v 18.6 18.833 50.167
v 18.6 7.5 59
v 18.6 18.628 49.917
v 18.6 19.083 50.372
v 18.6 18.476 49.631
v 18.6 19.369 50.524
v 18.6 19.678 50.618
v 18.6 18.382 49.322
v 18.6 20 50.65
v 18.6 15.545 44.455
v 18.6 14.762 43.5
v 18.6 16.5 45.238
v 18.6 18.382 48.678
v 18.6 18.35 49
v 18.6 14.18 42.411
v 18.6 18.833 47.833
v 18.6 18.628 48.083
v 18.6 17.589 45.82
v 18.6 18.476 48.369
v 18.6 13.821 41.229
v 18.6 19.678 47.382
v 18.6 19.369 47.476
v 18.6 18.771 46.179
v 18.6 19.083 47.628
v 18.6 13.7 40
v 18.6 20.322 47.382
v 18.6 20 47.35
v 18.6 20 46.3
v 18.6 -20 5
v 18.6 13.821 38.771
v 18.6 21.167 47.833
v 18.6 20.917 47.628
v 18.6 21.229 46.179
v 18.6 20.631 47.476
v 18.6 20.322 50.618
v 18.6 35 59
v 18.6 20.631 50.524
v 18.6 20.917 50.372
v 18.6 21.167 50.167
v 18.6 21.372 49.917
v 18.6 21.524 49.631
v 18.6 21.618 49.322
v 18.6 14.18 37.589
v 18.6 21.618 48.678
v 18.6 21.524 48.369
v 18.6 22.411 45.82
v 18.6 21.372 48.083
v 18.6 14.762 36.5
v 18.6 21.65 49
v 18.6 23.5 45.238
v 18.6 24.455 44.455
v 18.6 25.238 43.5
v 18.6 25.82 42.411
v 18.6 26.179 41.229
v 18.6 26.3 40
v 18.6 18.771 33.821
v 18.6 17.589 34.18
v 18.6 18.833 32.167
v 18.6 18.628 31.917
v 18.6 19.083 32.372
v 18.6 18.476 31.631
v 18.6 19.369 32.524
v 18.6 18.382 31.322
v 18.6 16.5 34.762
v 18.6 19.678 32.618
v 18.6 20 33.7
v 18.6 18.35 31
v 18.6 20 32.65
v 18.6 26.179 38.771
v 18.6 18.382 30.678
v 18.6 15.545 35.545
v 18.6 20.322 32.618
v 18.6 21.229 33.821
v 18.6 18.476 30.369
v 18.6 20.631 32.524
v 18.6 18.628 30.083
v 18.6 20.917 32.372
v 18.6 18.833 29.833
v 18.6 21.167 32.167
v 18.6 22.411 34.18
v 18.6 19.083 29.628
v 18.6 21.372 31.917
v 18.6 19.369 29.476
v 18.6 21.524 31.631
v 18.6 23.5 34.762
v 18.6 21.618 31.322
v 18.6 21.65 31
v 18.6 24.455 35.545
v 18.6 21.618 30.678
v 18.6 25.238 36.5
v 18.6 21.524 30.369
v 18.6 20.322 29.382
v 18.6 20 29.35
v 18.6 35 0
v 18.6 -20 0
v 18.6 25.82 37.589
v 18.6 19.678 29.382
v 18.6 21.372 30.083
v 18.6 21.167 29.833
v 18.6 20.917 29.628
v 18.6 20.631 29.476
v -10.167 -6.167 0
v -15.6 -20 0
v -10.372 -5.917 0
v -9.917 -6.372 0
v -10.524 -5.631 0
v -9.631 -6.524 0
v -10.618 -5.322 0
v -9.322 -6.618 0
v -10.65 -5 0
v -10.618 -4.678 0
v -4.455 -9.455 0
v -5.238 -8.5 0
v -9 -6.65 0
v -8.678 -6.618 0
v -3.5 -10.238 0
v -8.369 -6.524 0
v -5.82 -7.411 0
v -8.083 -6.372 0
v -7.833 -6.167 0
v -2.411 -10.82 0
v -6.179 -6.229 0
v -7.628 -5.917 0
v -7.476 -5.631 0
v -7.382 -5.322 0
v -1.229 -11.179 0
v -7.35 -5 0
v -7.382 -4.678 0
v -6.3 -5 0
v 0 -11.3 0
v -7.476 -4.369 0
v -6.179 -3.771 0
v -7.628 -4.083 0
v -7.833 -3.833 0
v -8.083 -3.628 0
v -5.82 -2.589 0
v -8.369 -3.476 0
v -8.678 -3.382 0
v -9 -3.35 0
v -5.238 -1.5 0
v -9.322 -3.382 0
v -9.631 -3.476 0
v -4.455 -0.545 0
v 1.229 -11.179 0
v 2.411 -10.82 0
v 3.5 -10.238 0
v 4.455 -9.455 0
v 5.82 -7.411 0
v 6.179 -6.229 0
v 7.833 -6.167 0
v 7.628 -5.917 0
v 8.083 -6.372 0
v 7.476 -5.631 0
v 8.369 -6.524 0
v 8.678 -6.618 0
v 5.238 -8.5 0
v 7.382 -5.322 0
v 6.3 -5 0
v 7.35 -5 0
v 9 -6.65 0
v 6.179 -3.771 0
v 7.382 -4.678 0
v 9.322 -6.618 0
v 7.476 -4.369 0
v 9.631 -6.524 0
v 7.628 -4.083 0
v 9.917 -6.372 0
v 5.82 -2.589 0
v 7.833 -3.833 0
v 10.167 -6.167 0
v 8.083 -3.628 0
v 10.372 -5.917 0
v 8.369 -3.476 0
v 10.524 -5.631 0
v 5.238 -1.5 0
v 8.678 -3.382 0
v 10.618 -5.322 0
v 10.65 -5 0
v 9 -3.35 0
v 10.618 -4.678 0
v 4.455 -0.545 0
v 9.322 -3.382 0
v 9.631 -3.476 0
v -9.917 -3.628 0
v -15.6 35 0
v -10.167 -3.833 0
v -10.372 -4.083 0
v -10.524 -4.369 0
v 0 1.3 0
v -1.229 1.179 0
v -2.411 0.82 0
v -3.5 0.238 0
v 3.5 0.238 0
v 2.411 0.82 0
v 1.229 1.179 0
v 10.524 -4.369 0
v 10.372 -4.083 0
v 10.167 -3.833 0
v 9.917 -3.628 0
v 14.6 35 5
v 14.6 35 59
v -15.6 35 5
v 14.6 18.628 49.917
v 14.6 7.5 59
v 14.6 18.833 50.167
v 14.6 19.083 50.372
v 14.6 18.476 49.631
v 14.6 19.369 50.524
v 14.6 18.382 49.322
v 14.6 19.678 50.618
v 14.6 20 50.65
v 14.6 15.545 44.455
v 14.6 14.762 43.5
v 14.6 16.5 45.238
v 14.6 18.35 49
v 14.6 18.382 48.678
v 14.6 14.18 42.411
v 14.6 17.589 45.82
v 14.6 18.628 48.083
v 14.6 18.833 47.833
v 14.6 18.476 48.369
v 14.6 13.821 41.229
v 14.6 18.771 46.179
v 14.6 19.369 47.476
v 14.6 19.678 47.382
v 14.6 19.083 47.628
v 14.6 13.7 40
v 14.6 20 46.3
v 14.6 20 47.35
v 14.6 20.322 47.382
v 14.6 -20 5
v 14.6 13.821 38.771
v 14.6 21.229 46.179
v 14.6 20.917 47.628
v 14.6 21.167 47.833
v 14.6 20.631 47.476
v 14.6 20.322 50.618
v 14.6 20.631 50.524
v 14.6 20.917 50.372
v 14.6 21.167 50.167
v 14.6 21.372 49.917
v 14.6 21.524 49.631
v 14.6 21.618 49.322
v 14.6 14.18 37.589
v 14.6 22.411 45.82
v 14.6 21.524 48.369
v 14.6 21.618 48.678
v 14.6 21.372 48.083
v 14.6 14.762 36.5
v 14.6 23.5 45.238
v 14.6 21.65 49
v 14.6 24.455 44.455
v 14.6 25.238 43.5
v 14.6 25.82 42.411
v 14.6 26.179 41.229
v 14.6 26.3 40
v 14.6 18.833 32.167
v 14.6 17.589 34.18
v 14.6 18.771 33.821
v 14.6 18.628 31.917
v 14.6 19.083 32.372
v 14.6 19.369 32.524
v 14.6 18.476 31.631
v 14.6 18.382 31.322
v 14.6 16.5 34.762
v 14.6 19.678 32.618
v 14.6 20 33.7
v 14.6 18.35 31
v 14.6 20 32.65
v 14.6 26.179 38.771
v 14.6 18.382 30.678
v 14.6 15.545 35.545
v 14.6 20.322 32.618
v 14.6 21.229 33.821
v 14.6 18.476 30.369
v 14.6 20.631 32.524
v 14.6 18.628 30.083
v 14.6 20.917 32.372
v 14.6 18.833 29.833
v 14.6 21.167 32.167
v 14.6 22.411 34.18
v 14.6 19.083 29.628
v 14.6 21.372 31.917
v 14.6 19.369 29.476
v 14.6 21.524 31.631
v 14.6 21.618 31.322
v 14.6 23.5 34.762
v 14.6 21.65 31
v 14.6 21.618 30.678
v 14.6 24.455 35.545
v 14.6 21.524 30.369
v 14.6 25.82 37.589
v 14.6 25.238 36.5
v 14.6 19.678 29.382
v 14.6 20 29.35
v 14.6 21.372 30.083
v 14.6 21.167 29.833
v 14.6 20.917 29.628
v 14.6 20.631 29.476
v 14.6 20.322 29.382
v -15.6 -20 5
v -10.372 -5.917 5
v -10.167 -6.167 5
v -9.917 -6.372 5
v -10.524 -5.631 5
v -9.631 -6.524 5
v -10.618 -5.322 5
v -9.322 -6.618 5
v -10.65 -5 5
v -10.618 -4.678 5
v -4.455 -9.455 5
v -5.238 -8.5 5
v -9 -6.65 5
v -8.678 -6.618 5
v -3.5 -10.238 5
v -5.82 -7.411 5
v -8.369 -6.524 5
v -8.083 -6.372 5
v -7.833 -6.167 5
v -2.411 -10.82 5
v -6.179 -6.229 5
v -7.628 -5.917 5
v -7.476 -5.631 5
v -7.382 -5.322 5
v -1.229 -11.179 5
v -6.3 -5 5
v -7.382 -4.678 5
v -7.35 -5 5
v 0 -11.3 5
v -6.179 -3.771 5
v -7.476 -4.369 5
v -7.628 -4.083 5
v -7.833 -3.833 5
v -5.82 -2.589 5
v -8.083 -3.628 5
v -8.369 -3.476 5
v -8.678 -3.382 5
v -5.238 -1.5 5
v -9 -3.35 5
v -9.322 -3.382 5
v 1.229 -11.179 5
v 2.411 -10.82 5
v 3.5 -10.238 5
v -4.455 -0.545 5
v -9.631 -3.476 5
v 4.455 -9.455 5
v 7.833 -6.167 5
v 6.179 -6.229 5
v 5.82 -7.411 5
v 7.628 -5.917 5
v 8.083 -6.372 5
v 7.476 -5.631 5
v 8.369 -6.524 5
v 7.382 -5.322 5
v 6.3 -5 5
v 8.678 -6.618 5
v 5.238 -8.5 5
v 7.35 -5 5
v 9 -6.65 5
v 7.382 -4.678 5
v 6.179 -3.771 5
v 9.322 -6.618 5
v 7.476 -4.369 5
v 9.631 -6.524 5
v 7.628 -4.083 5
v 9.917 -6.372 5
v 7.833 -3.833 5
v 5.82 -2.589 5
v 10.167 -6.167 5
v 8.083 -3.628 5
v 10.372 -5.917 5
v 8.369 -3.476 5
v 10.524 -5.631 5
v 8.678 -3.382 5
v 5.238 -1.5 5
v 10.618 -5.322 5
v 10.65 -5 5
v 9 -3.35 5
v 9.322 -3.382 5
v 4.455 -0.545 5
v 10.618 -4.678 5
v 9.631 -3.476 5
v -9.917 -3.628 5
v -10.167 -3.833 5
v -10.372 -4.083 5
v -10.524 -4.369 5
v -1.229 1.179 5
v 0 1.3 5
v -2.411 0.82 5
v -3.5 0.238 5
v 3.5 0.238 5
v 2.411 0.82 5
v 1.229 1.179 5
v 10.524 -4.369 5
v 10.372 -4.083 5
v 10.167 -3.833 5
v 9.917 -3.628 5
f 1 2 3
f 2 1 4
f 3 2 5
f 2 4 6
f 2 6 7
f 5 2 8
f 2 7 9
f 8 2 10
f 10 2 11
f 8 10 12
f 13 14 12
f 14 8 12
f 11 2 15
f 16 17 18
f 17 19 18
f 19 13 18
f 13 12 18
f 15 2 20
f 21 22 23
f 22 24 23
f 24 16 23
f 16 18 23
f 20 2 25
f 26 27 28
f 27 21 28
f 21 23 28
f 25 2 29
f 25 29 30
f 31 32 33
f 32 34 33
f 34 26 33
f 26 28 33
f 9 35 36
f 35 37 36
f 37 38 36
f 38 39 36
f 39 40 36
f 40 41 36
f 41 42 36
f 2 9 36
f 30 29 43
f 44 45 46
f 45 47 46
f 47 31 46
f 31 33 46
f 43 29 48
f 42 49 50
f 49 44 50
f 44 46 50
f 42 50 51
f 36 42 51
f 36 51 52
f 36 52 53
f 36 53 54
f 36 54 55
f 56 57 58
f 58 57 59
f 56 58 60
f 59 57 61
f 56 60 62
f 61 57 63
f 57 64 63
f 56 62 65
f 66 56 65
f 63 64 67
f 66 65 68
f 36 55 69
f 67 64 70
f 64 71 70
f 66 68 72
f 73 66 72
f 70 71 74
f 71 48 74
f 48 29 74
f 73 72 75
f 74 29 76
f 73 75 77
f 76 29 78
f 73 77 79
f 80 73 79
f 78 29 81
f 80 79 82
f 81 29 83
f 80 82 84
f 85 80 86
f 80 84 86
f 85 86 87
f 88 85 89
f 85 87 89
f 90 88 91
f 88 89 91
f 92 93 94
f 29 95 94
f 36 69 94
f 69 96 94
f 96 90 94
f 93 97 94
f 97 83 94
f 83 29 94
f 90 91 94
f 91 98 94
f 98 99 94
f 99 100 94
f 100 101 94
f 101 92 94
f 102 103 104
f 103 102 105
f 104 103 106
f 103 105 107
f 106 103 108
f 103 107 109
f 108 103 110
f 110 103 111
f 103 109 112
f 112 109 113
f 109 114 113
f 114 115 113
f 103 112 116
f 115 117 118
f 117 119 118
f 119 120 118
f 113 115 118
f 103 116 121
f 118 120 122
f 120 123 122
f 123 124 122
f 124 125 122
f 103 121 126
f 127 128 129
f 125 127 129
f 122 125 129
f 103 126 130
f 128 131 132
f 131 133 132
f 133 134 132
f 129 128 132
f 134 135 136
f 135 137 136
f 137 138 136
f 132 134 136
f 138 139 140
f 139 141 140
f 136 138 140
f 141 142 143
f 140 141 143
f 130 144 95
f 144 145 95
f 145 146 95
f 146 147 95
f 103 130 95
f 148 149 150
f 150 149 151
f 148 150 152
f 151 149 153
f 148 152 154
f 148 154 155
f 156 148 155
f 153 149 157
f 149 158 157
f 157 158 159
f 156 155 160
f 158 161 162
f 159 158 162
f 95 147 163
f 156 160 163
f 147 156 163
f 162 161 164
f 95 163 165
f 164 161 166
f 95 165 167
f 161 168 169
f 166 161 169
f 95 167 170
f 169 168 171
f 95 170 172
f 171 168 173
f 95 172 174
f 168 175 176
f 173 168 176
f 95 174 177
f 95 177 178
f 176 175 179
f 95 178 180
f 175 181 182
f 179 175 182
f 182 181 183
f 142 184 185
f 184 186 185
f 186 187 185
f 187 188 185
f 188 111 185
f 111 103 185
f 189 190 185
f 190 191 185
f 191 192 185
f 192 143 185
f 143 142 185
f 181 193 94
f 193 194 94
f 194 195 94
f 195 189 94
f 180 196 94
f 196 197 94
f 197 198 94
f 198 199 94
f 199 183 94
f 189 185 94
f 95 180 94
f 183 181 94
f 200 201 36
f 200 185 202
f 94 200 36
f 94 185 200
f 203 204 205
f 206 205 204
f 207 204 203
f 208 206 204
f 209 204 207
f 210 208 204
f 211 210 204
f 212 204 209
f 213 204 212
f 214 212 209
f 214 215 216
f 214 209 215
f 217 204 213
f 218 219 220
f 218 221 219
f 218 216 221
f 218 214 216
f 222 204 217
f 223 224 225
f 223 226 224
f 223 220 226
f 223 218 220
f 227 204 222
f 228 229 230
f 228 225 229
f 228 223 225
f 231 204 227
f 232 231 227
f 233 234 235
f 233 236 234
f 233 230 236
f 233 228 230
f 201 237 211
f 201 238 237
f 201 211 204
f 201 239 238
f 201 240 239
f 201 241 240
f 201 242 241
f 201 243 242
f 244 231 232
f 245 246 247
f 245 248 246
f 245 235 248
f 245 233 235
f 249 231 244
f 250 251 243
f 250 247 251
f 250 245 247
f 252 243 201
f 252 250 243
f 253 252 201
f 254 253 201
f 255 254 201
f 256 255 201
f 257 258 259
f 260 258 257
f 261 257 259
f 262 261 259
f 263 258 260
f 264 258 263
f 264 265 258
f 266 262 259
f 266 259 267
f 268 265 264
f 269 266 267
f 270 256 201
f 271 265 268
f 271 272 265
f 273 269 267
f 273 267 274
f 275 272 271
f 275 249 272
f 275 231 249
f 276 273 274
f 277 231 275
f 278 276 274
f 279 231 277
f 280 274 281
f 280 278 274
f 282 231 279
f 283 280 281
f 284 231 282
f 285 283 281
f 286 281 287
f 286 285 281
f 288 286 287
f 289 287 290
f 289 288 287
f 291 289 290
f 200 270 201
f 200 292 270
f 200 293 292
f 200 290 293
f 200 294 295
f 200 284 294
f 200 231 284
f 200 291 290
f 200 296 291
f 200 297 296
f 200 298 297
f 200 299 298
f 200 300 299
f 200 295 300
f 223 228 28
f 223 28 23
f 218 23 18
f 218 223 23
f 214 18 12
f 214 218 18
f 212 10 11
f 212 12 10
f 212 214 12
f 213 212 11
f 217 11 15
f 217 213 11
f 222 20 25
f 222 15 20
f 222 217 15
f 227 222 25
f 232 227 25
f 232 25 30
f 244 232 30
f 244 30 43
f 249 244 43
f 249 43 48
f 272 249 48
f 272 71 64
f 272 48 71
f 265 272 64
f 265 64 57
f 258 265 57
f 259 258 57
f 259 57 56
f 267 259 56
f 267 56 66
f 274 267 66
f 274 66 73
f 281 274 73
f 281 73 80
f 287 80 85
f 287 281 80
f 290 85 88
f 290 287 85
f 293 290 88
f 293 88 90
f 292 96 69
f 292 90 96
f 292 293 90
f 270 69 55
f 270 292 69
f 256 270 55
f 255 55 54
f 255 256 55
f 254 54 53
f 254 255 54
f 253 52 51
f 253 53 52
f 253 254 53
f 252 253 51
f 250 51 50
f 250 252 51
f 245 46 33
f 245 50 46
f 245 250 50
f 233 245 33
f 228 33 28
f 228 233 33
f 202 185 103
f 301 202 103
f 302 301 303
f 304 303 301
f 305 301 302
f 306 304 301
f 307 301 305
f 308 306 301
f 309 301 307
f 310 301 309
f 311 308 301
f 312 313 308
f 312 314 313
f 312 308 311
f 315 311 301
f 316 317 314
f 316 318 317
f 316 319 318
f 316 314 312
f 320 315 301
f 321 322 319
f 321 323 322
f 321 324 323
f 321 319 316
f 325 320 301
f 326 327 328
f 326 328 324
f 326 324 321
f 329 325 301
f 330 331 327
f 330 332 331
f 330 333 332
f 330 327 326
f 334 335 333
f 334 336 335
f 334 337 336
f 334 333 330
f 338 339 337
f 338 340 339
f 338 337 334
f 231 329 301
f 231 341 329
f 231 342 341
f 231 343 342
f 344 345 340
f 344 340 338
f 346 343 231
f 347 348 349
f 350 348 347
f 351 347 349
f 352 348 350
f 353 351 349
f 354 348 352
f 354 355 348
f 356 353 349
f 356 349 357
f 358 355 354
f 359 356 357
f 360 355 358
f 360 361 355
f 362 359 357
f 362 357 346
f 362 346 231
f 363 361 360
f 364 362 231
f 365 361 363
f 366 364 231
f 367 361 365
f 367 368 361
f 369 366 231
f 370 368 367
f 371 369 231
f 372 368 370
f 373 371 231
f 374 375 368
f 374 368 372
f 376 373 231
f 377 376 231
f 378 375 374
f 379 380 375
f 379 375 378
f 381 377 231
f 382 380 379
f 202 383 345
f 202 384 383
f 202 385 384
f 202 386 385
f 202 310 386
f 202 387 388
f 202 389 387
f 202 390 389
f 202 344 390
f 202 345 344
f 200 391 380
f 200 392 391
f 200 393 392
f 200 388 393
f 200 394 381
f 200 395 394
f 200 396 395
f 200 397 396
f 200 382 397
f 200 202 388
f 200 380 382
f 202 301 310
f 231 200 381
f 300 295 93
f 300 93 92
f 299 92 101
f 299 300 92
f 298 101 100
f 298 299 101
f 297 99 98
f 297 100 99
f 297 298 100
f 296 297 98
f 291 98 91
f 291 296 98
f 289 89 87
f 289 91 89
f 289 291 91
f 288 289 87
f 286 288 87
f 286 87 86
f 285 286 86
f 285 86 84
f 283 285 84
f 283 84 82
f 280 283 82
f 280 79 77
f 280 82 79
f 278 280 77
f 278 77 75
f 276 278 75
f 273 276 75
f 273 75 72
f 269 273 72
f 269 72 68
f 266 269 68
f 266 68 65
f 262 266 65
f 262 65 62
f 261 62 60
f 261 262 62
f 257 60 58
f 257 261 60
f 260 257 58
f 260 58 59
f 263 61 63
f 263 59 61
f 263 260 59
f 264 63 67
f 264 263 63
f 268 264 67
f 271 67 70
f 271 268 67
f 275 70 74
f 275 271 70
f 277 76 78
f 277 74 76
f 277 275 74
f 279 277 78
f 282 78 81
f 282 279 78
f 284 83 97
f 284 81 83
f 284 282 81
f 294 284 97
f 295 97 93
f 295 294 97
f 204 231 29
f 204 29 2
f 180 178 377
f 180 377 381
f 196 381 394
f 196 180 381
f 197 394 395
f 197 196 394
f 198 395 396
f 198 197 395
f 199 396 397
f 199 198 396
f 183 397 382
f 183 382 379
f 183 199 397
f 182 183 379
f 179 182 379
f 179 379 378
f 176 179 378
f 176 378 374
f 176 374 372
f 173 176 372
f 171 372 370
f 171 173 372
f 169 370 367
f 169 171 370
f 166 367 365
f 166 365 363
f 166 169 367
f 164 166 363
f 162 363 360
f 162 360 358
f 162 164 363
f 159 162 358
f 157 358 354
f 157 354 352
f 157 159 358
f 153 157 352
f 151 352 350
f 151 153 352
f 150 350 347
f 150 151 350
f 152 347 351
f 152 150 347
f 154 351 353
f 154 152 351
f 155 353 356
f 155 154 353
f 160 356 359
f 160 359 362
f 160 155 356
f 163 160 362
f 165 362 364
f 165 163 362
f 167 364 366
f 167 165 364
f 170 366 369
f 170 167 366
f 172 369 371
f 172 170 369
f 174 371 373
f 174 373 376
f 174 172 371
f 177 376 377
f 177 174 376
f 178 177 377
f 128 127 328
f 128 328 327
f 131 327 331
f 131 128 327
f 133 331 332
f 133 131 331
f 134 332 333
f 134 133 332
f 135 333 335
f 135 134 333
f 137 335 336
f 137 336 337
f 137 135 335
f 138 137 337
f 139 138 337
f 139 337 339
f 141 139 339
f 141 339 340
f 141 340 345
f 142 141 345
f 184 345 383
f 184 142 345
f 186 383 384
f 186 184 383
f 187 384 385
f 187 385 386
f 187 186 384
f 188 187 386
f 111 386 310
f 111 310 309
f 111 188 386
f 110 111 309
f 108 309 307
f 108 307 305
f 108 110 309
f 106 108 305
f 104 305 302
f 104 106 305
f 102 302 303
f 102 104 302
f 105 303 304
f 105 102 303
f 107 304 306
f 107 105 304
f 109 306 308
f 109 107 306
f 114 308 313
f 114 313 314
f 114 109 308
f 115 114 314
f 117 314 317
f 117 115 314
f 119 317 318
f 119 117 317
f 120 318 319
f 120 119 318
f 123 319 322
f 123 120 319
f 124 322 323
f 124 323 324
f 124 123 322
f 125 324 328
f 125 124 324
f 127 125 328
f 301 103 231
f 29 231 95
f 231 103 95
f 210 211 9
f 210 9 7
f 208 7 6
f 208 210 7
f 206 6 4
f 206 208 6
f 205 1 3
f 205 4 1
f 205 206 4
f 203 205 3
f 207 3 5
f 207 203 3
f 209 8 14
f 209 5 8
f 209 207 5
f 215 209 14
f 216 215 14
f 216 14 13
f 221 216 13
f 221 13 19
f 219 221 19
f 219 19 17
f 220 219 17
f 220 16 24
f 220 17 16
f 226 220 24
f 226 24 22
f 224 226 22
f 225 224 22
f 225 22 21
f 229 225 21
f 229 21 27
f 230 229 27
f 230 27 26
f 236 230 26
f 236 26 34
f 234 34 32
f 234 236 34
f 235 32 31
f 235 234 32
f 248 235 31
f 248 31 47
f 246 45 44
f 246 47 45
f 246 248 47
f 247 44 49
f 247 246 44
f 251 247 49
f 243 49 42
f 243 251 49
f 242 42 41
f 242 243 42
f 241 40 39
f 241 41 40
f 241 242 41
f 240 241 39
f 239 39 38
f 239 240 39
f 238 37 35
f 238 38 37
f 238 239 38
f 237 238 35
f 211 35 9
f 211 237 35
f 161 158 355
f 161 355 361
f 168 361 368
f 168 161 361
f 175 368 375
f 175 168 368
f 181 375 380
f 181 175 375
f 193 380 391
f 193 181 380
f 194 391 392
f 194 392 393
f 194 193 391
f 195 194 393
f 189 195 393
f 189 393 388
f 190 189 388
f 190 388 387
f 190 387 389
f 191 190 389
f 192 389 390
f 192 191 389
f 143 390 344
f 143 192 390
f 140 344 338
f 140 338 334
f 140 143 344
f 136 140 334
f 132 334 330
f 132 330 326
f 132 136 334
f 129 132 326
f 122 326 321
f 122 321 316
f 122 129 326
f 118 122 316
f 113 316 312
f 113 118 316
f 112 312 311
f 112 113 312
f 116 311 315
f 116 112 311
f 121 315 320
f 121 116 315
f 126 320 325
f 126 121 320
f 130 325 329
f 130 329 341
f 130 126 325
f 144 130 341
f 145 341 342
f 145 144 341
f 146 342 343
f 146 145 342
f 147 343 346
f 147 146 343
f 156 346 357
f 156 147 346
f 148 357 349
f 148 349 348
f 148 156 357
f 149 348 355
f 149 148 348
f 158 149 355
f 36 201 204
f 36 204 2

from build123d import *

# Parameters (mm, degrees)
SKETCH_2_R          = 1.65
SKETCH_2_R_2        = 6.3
EXTRUDE_1_DEPTH     = 5
SKETCH_4_W          = 4
SKETCH_4_H          = 55
EXTRUDE_3_DEPTH     = 54
CUT_EXTRUDE_1_DEPTH = 54


with BuildPart() as part:
    # 草图2 → 凸台-拉伸1 (new body)
    with BuildSketch(Plane.XY):
        Polygon((15.6, 35), (0, 35), (-15.6, 35), (-15.6, -20), (18.6, -20), (18.6, 35), align=None)
        with Locations((-9, -5)):
            Circle(SKETCH_2_R, mode=Mode.SUBTRACT)
        with Locations((0, -5)):
            Circle(SKETCH_2_R_2, mode=Mode.SUBTRACT)
        with Locations((9, -5)):
            Circle(SKETCH_2_R, mode=Mode.SUBTRACT)
    extrude(amount=EXTRUDE_1_DEPTH)

    # 草图4 → 凸台-拉伸3 (add)
    with BuildSketch(Plane.XY.offset(5)):
        with Locations((16.6, 7.5)):
            Rectangle(SKETCH_4_W, SKETCH_4_H)
    extrude(amount=EXTRUDE_3_DEPTH)

    # 草图6 → 切除-拉伸1 (cut)
    with BuildSketch(Plane(origin=(0, 0, 0), x_dir=(0, 0, -1), z_dir=(1, 0, 0))):
        Polygon((-59, 7.5), (-59, -20), (-5, -20), align=None)
        with BuildLine():
            ThreePointArc((-32.65, 20), (-31, 18.35), (-29.35, 20))
            Line((-29.35, 20), (-32.65, 20))
        make_face()
        with BuildLine():
            Line((-32.65, 20), (-29.35, 20))
            ThreePointArc((-29.35, 20), (-31, 21.65), (-32.65, 20))
        make_face()
        with BuildLine():
            ThreePointArc((-33.7, 20), (-40, 26.3), (-46.3, 20))
            Line((-46.3, 20), (-33.7, 20))
        make_face()
        with BuildLine():
            Line((-33.7, 20), (-46.3, 20))
            ThreePointArc((-46.3, 20), (-40, 13.7), (-33.7, 20))
        make_face()
        with BuildLine():
            ThreePointArc((-47.35, 20), (-49, 21.65), (-50.65, 20))
            Line((-50.65, 20), (-47.35, 20))
        make_face()
        with BuildLine():
            Line((-47.35, 20), (-50.65, 20))
            ThreePointArc((-50.65, 20), (-49, 18.35), (-47.35, 20))
        make_face()
    extrude(amount=CUT_EXTRUDE_1_DEPTH, mode=Mode.SUBTRACT)


solid = part.part
